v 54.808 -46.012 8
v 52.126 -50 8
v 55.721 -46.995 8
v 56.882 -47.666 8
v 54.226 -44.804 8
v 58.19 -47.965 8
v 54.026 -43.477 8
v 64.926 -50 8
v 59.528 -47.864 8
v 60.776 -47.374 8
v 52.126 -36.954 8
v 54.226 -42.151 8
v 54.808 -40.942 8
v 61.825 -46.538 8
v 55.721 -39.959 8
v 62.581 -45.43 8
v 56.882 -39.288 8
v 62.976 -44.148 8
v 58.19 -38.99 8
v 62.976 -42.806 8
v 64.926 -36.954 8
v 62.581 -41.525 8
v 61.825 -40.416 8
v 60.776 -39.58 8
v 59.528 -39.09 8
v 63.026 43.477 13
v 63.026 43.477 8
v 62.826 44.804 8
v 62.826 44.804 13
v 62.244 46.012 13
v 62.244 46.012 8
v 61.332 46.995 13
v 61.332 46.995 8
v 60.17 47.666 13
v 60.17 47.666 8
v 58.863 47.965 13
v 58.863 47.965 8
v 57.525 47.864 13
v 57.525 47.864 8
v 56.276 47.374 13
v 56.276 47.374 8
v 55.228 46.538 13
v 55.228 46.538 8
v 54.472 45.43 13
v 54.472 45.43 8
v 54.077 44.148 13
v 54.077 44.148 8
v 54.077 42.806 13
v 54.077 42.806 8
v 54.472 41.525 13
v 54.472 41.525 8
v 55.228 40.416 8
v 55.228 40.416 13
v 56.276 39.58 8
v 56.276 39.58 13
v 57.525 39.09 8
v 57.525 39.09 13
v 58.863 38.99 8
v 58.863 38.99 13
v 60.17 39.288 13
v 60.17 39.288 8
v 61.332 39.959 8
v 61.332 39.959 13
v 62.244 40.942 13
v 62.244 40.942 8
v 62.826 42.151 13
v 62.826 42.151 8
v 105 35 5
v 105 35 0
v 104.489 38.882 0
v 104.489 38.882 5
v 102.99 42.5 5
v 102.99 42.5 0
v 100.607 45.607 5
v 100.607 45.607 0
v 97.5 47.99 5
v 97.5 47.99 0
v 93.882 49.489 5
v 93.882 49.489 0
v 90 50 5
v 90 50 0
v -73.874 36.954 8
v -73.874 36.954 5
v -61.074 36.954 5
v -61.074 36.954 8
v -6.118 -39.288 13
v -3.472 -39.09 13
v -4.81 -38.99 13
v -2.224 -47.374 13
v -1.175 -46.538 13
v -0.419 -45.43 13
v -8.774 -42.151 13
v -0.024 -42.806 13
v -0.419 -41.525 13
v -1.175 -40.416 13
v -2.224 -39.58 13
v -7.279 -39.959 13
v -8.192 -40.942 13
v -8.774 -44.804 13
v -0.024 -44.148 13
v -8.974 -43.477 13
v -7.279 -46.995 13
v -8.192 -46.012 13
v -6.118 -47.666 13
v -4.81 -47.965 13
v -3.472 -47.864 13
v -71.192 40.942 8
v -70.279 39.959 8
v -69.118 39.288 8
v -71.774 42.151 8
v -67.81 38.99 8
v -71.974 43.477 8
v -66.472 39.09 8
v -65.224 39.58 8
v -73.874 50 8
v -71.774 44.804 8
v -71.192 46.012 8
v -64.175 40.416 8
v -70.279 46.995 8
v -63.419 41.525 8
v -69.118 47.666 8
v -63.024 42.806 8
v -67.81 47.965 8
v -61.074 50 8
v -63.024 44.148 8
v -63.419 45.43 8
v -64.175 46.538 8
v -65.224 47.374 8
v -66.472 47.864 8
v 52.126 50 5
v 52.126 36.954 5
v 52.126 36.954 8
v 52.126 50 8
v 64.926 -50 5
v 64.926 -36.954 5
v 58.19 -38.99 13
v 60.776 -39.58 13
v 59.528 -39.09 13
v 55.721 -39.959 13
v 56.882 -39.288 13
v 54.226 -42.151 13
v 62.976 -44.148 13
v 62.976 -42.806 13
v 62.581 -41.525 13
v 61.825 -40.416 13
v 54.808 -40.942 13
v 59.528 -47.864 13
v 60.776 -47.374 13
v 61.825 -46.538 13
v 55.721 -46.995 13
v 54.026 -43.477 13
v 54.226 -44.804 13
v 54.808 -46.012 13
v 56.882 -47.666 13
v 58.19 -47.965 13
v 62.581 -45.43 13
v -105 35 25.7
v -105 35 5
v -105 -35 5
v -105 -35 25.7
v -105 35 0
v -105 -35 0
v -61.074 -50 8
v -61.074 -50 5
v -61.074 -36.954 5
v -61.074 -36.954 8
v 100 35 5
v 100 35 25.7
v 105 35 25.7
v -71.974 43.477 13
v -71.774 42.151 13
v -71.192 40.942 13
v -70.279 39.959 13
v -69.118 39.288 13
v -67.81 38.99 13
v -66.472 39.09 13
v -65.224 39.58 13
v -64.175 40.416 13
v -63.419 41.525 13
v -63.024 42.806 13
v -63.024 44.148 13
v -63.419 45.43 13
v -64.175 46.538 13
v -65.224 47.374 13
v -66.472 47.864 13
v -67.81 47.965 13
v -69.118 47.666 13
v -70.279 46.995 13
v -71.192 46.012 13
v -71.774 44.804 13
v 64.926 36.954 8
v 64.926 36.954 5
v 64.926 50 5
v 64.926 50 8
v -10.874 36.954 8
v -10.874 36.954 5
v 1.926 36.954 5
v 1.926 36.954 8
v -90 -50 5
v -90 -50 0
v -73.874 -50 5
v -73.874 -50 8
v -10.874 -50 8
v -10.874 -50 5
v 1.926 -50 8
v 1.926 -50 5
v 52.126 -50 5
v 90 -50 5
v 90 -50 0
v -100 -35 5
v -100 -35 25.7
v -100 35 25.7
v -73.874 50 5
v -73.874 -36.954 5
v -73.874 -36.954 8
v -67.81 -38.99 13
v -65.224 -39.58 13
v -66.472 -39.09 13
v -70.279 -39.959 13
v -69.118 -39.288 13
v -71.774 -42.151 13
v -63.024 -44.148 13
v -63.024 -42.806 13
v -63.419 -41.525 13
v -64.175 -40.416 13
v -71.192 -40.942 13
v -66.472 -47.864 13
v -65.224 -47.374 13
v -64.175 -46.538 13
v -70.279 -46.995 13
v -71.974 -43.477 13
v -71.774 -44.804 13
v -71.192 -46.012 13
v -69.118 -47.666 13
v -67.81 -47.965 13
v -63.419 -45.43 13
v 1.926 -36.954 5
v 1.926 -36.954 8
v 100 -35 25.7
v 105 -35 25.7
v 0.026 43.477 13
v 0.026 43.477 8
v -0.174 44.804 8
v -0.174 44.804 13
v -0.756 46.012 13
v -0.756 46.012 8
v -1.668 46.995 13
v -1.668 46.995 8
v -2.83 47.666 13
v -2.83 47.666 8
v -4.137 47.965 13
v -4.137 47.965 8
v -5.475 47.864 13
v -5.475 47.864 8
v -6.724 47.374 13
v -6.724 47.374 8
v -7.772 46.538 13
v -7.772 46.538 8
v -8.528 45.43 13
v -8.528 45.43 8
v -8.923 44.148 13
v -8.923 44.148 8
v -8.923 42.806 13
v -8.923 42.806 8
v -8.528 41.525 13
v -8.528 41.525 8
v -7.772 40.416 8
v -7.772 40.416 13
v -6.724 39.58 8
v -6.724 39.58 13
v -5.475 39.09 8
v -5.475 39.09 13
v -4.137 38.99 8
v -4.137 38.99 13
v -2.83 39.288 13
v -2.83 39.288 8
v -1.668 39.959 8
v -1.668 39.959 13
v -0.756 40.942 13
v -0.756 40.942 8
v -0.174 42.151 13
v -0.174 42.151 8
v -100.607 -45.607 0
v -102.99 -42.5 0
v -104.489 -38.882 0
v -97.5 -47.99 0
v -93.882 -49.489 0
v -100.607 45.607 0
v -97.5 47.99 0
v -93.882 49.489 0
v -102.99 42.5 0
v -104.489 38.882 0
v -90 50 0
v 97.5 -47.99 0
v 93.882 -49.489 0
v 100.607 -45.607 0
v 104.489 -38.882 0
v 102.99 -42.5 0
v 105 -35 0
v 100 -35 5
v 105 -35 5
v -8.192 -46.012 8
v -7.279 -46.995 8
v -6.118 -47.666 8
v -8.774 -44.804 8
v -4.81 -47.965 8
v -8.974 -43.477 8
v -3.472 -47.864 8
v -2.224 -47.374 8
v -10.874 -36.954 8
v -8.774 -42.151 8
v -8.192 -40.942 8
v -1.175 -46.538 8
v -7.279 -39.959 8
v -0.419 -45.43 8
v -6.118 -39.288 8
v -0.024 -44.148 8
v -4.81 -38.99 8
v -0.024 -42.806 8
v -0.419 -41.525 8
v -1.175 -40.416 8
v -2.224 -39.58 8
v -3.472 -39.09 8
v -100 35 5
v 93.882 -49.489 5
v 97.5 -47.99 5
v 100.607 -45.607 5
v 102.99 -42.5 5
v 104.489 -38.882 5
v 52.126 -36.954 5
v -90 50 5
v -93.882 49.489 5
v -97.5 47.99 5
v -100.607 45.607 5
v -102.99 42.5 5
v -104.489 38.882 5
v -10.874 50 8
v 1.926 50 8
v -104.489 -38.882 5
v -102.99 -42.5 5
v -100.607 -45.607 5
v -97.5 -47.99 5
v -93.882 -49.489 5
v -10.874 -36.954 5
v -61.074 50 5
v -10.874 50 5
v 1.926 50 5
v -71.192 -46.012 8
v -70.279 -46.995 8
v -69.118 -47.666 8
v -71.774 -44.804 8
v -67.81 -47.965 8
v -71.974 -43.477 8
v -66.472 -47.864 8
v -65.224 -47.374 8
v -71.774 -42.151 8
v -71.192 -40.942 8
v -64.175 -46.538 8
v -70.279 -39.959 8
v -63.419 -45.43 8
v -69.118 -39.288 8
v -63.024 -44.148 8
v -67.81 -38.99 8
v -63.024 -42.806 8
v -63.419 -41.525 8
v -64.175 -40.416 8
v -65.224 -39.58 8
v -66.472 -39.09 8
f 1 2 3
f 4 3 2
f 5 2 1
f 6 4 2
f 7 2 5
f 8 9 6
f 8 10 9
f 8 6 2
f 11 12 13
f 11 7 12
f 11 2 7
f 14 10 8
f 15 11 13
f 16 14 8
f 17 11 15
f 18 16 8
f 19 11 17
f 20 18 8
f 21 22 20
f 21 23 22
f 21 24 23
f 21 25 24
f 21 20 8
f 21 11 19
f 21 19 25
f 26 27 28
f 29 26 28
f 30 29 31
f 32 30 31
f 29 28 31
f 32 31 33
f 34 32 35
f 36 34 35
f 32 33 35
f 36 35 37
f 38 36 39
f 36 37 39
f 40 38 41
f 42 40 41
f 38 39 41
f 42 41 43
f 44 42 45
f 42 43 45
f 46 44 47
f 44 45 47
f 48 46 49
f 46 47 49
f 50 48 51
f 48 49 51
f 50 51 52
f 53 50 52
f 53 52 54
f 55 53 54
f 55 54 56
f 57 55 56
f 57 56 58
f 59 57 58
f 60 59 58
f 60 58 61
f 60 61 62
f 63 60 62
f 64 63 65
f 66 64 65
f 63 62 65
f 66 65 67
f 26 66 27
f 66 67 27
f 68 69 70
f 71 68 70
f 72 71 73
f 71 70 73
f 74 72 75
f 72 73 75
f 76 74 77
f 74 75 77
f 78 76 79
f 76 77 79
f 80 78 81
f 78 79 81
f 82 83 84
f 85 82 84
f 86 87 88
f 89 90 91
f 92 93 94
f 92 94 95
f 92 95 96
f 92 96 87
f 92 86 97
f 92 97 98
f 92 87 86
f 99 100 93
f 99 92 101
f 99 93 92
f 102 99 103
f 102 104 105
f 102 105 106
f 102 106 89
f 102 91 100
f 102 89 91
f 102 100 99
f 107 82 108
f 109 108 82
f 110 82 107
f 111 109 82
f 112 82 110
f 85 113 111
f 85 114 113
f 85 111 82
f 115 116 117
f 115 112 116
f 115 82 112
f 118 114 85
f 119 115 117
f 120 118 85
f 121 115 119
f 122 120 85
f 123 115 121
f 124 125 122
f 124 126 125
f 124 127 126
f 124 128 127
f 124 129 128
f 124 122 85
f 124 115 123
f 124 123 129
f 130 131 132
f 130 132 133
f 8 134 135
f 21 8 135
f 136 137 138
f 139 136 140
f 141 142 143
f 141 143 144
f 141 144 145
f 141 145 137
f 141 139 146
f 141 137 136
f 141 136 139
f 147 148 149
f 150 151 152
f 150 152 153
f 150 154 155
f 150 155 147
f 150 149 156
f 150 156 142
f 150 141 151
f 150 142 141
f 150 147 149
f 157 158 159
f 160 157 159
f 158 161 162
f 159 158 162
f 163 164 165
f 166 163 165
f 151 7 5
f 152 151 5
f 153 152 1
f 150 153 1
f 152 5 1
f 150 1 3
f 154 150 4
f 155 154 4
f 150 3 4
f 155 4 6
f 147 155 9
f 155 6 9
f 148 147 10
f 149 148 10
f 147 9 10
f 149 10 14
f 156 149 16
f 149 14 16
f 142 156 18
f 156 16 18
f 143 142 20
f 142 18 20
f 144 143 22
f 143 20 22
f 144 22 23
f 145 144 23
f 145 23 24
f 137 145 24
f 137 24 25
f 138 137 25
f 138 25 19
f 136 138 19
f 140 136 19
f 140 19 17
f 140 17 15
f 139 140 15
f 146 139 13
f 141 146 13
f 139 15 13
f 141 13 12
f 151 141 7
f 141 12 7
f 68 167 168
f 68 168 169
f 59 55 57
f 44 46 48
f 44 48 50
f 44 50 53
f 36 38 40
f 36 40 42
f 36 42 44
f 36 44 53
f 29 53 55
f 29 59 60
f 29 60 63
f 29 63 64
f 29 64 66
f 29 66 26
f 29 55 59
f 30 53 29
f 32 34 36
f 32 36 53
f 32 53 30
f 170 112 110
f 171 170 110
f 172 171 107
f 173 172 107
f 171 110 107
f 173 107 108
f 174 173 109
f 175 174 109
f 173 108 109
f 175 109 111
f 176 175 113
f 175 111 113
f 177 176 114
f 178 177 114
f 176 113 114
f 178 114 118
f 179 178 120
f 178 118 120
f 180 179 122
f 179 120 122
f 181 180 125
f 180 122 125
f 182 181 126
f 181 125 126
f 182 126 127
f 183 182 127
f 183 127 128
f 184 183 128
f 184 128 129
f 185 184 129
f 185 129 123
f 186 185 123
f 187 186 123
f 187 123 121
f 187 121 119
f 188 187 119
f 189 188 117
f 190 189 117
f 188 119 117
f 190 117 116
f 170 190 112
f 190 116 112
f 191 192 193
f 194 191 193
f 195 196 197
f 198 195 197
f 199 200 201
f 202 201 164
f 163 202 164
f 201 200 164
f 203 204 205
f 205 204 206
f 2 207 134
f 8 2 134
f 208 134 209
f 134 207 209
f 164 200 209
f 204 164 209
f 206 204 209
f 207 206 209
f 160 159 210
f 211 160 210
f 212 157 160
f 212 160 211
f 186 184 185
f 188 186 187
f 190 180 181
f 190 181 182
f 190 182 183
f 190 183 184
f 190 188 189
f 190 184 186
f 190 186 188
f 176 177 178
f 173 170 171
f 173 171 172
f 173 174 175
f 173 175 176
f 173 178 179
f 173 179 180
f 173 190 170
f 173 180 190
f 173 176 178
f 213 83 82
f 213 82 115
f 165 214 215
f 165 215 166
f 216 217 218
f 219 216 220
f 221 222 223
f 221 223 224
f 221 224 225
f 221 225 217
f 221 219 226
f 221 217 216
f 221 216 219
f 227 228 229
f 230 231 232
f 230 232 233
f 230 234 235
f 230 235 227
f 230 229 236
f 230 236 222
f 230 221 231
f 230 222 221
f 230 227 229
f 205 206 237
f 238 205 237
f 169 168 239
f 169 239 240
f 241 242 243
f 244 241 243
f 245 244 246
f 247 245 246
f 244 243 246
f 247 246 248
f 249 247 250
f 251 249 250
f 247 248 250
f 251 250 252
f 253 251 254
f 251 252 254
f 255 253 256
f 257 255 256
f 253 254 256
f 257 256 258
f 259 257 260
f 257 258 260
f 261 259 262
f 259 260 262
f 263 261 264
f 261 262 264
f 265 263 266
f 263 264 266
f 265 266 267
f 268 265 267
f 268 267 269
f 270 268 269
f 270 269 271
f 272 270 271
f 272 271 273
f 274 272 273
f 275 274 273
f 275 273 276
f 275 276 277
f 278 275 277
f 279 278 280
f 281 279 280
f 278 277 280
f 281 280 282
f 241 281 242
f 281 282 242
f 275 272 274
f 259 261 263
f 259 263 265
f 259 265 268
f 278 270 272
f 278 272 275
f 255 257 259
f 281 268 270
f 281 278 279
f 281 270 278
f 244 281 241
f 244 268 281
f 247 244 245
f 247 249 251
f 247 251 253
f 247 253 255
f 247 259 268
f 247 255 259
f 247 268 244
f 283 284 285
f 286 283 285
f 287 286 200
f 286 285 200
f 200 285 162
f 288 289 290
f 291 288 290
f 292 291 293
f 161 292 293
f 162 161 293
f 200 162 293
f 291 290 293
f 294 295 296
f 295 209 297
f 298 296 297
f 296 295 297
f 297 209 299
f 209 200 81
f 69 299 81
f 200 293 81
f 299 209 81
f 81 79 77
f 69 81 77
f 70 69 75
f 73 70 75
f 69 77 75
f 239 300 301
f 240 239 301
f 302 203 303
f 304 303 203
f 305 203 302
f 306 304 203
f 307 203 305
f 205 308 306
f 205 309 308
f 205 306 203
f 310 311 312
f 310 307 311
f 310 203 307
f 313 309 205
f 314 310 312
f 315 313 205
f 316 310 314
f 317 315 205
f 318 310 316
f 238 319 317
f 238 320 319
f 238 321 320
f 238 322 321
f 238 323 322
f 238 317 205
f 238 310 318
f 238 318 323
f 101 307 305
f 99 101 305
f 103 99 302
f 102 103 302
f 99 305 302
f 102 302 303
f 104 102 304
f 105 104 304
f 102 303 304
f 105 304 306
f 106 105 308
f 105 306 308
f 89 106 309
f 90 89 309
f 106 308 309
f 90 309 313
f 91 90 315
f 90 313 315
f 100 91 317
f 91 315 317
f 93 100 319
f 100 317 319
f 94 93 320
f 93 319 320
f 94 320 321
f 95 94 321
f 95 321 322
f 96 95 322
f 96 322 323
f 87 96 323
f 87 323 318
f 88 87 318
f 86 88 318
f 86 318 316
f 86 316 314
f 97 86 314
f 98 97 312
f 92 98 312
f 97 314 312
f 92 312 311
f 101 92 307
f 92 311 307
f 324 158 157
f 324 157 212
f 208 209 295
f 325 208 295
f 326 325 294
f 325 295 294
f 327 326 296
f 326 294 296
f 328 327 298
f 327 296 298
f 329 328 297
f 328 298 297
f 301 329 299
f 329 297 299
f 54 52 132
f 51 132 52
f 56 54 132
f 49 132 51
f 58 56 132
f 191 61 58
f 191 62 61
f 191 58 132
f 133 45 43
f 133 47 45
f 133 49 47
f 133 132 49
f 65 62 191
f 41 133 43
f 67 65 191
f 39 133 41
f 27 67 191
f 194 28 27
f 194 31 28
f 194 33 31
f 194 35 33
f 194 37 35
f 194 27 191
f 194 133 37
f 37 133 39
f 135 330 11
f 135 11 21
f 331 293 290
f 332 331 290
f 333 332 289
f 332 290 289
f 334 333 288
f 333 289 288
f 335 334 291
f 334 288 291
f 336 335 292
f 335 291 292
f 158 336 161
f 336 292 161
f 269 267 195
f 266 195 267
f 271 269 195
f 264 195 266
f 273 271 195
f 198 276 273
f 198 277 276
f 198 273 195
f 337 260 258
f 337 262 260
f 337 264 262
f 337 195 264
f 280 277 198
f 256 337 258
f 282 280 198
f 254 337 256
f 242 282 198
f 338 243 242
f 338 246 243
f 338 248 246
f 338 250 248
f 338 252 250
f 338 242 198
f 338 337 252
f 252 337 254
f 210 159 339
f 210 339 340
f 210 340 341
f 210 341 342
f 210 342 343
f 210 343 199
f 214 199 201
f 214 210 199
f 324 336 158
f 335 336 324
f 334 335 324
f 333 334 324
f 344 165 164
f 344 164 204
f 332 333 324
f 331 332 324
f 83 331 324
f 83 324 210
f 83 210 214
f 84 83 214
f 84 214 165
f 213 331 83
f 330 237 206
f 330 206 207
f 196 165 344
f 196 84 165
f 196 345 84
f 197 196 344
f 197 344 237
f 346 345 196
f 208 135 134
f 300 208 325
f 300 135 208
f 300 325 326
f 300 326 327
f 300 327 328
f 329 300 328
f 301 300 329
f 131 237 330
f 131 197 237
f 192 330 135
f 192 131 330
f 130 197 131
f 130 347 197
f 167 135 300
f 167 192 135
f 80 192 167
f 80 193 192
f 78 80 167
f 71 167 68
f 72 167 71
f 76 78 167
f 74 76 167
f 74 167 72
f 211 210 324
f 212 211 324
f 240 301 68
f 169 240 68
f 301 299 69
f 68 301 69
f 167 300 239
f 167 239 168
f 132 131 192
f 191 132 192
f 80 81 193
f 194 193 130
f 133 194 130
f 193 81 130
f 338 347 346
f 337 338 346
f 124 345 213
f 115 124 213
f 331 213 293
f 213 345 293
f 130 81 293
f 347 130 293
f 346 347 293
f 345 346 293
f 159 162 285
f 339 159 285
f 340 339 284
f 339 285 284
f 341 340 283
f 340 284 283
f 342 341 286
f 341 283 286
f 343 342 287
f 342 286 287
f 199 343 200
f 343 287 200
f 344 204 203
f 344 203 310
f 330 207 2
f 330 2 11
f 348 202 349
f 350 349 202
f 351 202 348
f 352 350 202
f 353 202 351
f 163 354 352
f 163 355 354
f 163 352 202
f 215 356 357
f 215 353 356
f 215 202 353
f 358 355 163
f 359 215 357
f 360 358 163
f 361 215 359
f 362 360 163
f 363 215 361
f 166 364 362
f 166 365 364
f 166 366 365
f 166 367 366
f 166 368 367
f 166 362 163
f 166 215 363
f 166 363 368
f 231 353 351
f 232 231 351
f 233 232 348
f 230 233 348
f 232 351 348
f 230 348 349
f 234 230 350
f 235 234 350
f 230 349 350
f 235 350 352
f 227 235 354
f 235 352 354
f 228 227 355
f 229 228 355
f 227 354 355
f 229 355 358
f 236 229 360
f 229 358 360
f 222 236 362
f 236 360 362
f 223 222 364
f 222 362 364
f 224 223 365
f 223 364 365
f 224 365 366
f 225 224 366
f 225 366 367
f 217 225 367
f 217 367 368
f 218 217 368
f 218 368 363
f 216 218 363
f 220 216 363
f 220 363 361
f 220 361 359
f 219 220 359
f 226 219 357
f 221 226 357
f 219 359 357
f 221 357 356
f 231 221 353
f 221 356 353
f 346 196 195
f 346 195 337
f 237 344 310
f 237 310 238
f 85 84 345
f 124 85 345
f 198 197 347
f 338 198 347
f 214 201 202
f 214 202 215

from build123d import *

# Parameters (mm, degrees)
BOSS_EXTRUDE1_DEPTH = 5
SKETCH3_W           = 5
SKETCH3_H           = 70
BOSS_EXTRUDE3_DEPTH = 20.7
SKETCH2_W           = 12.8
SKETCH2_H           = 13.045671514
BOSS_EXTRUDE4_DEPTH = 3
SKETCH4_R           = 4.5
BOSS_EXTRUDE5_DEPTH = 5


with BuildPart() as part:
    # Sketch1 → Boss-Extrude1 (new body)
    with BuildSketch(Plane.XY):
        with BuildLine():
            Line((-90, -50), (90, -50))
            ThreePointArc((90, -50), (100.606601718, -45.606601718), (105, -35))
            Line((105, -35), (105, 35))
            ThreePointArc((105, 35), (100.606601718, 45.606601718), (90, 50))
            Line((90, 50), (-90, 50))
            ThreePointArc((-90, 50), (-100.606601718, 45.606601718), (-105, 35))
            Line((-105, 35), (-105, -35))
            ThreePointArc((-105, -35), (-100.606601718, -45.606601718), (-90, -50))
        make_face()
    extrude(amount=BOSS_EXTRUDE1_DEPTH)

    # Sketch3 → Boss-Extrude3 (add)
    with BuildSketch(Plane.XY.offset(5)):
        with Locations((102.5, 0)):
            Rectangle(SKETCH3_W, SKETCH3_H)
        with Locations((-102.5, 0)):
            Rectangle(SKETCH3_W, SKETCH3_H)
    extrude(amount=BOSS_EXTRUDE3_DEPTH)

    # Sketch2 → Boss-Extrude4 (add)
    with BuildSketch(Plane.XY.offset(5)):
        with Locations((-67.473686504, 43.477164243)):
            Rectangle(SKETCH2_W, SKETCH2_H)
        with Locations((-4.473686504, 43.477164243)):
            Rectangle(SKETCH2_W, SKETCH2_H)
        with Locations((58.526313496, 43.477164243)):
            Rectangle(SKETCH2_W, SKETCH2_H)
        with Locations((-67.473686504, -43.477164243)):
            Rectangle(SKETCH2_W, SKETCH2_H)
        with Locations((-4.473686504, -43.477164243)):
            Rectangle(SKETCH2_W, SKETCH2_H)
        with Locations((58.526313496, -43.477164243)):
            Rectangle(SKETCH2_W, SKETCH2_H)
    extrude(amount=BOSS_EXTRUDE4_DEPTH)

    # Sketch4 → Boss-Extrude5 (add)
    with BuildSketch(Plane.XY.offset(8)):
        with Locations(Location((-67.473686504, 43.477164243, 0), (0, 0, 180))):
            Circle(SKETCH4_R)
        with Locations((-4.473686504, 43.477164243)):
            Circle(SKETCH4_R)
        with Locations((58.526313496, 43.477164243)):
            Circle(SKETCH4_R)
        with Locations(Location((58.526313496, -43.477164243, 0), (0, 0, 180))):
            Circle(SKETCH4_R)
        with Locations(Location((-4.473686504, -43.477164243, 0), (0, 0, 180))):
            Circle(SKETCH4_R)
        with Locations(Location((-67.473686504, -43.477164243, 0), (0, 0, 180))):
            Circle(SKETCH4_R)
    extrude(amount=BOSS_EXTRUDE5_DEPTH)


solid = part.part
